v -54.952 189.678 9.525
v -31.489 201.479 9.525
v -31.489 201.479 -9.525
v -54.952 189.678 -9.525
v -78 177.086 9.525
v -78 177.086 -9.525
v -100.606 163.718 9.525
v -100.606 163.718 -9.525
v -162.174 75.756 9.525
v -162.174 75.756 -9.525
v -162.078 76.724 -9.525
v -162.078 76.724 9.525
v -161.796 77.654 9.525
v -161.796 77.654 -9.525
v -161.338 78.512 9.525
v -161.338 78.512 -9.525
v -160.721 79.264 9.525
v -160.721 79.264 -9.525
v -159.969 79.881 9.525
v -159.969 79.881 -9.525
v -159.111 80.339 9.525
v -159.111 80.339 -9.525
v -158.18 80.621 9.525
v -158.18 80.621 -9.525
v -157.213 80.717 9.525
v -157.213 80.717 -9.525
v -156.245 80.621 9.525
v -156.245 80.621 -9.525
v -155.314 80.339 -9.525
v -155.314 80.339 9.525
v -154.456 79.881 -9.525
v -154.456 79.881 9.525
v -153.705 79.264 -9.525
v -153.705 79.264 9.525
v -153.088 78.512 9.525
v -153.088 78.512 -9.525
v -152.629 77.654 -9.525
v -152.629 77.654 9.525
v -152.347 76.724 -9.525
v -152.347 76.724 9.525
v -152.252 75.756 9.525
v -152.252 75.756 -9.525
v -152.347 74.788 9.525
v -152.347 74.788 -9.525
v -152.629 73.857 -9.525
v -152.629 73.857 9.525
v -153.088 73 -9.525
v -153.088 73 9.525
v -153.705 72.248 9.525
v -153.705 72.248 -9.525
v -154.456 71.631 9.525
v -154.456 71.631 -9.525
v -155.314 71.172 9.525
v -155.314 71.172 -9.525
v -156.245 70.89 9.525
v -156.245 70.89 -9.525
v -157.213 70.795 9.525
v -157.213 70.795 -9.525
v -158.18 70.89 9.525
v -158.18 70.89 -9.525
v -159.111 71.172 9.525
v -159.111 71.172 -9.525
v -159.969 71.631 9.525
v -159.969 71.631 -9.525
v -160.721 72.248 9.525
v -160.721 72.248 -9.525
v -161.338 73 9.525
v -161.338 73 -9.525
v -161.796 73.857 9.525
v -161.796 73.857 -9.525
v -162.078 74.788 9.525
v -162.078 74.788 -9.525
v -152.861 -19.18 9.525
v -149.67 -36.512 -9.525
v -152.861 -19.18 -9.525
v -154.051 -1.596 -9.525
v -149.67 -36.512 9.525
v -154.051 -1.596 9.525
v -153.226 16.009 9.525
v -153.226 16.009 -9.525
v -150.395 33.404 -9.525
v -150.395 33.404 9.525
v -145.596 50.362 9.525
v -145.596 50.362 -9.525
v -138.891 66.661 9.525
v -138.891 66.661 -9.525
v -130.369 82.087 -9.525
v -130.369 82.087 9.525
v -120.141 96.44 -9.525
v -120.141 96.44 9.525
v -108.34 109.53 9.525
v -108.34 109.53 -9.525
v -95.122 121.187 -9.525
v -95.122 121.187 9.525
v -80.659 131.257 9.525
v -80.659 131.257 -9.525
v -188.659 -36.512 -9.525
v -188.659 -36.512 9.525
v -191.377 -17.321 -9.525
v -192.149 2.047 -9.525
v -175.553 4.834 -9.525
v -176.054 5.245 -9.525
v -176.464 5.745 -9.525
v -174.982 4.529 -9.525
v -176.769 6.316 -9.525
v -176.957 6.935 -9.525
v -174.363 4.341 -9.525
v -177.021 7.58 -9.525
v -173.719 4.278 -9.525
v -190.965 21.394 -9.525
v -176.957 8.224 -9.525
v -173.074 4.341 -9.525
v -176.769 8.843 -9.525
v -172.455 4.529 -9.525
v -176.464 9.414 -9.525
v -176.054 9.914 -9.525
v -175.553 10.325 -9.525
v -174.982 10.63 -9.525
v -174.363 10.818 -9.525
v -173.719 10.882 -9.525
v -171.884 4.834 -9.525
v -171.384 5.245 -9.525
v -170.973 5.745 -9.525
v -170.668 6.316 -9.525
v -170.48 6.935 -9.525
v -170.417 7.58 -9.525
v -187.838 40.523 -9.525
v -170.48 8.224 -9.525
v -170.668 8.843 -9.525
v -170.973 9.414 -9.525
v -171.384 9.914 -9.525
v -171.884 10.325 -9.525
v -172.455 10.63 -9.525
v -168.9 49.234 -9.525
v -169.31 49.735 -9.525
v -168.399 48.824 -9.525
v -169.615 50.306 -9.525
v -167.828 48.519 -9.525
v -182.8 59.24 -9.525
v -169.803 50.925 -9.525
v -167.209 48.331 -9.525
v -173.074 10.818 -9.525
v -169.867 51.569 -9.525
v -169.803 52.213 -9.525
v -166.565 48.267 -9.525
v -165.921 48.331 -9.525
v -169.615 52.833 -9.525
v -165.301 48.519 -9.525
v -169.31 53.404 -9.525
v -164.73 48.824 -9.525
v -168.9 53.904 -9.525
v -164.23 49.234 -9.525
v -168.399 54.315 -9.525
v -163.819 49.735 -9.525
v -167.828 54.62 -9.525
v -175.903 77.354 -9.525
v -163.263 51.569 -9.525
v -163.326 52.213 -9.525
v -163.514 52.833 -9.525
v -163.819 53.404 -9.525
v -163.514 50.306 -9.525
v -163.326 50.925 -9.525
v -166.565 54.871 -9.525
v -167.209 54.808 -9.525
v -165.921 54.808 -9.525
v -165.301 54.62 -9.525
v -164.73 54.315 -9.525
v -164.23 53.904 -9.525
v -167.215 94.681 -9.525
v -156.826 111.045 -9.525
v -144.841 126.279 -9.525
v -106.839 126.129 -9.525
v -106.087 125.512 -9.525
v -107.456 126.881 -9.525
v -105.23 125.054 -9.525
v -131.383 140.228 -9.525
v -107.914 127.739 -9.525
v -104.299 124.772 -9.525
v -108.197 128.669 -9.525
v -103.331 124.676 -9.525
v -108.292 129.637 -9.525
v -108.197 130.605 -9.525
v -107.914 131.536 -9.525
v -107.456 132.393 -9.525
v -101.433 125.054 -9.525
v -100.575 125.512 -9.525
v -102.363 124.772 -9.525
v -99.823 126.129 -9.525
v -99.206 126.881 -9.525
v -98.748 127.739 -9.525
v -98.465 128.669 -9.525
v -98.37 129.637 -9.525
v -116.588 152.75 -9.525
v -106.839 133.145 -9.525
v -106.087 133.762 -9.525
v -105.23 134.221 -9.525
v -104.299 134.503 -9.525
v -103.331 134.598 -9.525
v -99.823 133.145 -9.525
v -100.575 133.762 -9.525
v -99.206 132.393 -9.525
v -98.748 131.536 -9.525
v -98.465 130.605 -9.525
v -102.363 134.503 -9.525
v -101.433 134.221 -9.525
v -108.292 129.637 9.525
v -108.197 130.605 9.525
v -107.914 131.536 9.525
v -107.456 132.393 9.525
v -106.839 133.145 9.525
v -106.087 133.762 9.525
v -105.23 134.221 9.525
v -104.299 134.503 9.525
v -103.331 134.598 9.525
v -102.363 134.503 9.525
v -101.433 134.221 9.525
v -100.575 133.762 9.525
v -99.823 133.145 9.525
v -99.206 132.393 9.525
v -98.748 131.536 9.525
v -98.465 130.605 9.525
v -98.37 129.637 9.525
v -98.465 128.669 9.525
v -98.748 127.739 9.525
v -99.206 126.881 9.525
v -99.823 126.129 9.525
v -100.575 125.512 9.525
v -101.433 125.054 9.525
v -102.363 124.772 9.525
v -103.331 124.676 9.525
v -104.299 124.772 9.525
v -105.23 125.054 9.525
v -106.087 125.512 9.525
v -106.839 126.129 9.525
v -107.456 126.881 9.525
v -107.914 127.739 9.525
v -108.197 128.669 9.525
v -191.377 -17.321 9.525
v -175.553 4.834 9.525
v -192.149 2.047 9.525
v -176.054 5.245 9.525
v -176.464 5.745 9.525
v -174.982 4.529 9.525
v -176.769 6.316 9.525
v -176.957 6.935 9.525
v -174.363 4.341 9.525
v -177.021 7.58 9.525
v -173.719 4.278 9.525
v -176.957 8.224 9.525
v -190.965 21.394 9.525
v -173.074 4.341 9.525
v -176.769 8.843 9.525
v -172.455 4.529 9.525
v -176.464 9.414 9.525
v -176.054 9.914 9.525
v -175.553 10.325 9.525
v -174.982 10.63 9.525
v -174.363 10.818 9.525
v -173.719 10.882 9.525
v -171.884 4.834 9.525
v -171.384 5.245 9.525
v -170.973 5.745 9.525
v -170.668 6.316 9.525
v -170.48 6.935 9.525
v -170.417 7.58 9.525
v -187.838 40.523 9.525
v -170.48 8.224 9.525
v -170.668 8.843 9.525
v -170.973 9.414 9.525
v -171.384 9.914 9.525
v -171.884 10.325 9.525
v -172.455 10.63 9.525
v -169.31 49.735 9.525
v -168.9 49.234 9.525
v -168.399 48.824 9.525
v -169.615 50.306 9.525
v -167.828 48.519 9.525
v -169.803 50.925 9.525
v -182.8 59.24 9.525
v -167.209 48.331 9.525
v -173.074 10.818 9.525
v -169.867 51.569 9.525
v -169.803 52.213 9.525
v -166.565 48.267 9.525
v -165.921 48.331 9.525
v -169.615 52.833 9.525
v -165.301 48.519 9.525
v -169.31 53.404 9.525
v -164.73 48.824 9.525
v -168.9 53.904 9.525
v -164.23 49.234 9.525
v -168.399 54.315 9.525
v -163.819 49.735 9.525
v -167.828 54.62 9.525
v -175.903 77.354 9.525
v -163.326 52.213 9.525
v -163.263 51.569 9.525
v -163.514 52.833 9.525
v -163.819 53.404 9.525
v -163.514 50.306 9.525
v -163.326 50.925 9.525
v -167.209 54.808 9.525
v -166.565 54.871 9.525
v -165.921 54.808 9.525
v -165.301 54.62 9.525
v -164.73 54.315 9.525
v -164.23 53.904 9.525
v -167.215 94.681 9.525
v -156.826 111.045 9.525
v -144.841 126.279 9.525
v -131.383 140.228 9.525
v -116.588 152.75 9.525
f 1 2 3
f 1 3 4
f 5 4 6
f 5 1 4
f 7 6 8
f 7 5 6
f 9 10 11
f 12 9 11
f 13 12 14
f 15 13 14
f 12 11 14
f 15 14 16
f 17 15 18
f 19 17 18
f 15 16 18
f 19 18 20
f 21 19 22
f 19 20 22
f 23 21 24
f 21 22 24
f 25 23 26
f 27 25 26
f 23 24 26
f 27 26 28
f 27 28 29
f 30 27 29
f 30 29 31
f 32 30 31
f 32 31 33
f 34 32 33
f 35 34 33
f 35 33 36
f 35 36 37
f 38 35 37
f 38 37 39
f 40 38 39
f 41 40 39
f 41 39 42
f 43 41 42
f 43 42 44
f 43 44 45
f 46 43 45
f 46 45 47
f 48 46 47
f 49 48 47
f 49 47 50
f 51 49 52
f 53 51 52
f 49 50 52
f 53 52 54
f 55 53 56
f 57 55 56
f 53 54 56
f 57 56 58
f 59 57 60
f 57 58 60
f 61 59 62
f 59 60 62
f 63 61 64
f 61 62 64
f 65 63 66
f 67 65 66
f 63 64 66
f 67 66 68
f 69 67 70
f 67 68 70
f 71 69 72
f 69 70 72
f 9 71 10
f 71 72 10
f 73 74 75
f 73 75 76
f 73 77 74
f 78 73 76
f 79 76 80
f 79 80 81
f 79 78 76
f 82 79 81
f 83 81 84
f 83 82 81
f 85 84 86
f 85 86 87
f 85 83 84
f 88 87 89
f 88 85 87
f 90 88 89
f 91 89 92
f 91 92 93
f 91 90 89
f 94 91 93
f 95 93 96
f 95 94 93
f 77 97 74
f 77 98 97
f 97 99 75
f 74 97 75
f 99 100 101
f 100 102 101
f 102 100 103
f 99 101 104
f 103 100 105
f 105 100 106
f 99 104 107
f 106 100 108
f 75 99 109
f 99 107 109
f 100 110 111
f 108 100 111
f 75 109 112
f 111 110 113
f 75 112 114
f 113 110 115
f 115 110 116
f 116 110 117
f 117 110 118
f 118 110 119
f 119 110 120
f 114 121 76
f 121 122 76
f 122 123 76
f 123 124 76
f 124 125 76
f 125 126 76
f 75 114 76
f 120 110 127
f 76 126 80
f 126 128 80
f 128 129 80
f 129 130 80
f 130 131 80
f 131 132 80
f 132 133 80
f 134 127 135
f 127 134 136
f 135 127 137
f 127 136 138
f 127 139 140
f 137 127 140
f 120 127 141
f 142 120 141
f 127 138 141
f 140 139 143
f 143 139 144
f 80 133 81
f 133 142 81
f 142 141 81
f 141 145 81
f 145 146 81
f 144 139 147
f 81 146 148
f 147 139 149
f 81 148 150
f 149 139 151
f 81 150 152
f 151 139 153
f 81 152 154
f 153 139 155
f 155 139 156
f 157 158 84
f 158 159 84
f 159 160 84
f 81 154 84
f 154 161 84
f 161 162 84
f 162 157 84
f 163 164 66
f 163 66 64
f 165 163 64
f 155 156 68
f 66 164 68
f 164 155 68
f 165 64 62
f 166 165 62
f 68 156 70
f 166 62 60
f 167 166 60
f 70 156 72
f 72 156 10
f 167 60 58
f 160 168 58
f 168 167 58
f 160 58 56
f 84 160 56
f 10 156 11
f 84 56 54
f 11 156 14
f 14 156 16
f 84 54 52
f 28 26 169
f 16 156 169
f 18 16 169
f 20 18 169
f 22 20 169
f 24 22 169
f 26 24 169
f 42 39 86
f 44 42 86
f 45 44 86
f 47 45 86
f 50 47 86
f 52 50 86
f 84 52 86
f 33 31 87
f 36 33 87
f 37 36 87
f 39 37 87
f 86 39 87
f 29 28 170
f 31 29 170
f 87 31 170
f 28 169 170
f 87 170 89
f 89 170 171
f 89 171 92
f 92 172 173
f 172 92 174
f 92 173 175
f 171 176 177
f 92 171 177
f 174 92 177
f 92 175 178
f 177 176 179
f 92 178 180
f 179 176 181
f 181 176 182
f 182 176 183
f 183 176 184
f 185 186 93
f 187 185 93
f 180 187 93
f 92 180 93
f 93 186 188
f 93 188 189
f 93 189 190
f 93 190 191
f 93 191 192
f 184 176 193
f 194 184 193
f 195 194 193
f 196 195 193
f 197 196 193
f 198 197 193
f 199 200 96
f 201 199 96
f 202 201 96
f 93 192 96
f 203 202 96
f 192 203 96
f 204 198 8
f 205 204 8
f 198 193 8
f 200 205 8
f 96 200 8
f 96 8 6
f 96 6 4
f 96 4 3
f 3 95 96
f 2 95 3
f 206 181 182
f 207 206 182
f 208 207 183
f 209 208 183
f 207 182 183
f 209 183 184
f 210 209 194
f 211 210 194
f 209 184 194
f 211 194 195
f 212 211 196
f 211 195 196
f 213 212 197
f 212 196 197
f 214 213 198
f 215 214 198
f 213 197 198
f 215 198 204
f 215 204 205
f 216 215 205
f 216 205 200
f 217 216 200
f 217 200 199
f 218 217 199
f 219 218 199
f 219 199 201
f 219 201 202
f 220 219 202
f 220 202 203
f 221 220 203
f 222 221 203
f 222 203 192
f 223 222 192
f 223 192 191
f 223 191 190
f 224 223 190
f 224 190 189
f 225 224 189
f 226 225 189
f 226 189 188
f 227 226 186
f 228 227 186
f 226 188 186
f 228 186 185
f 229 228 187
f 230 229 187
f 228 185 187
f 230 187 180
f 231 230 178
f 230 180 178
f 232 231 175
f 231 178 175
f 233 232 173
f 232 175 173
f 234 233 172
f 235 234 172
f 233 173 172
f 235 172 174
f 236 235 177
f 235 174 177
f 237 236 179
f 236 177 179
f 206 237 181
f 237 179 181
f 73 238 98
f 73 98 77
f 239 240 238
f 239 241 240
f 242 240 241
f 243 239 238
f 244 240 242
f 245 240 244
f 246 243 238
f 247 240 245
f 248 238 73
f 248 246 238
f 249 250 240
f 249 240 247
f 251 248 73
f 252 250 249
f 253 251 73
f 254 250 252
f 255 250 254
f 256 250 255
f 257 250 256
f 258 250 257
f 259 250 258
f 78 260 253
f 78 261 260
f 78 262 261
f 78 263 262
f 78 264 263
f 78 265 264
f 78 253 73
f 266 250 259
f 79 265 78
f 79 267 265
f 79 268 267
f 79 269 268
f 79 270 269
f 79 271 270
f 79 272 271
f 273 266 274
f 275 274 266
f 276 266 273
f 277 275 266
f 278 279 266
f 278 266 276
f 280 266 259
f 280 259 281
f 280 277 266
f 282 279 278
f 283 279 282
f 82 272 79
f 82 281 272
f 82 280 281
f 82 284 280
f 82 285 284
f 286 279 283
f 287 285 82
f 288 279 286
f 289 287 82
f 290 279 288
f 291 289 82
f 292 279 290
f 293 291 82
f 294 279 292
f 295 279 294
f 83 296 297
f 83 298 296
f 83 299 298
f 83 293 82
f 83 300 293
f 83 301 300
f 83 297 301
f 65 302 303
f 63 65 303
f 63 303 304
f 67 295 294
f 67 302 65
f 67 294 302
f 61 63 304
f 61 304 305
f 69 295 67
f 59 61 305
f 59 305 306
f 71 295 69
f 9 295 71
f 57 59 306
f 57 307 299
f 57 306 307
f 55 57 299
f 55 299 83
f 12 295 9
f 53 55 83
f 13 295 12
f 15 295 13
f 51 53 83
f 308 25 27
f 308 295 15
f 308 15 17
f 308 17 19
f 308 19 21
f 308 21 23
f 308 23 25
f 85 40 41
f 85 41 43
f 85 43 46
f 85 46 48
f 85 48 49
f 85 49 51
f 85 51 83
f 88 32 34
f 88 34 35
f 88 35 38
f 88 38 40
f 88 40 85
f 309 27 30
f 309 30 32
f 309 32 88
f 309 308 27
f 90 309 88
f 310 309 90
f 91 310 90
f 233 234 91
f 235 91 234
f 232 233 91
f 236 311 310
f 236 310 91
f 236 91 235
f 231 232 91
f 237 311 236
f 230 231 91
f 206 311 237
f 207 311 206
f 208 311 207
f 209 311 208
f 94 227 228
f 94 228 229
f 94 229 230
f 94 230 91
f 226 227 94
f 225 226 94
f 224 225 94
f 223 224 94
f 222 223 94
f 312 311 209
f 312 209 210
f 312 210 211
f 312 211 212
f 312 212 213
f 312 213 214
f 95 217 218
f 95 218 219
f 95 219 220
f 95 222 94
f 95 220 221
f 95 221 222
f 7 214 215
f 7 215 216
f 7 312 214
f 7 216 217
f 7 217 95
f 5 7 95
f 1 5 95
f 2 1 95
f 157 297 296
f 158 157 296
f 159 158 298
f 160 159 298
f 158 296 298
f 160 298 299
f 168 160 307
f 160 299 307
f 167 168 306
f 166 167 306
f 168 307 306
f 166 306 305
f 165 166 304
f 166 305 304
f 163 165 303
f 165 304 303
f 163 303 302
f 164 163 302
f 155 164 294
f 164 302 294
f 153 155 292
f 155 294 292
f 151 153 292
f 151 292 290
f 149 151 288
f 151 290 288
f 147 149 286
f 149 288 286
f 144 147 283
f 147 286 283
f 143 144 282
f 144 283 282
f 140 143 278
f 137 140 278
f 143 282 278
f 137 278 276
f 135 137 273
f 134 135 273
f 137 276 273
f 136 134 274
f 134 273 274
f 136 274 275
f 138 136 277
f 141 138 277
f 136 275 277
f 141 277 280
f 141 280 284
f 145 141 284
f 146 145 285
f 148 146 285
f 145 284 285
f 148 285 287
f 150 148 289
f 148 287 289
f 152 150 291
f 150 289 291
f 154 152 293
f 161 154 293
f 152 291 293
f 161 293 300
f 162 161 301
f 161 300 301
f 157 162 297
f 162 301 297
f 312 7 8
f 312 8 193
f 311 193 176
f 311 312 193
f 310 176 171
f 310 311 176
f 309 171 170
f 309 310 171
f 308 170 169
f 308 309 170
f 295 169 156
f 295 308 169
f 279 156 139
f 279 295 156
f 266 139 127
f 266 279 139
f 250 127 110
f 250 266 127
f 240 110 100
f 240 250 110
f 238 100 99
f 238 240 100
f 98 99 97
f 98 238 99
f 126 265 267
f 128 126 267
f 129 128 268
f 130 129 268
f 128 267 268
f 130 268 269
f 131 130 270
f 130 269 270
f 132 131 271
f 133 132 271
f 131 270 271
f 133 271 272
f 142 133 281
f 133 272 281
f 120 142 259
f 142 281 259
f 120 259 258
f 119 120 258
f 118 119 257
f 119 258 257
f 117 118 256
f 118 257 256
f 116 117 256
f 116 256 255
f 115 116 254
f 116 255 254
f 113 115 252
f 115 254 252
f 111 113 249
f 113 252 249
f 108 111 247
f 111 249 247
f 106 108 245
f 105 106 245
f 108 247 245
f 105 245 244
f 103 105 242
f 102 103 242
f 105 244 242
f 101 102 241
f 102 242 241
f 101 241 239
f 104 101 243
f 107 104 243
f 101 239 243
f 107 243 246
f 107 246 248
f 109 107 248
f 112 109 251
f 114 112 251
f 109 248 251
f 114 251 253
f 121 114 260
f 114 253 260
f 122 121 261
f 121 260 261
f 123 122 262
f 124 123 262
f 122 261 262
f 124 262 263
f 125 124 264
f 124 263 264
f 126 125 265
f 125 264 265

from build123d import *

# Parameters (mm, degrees)
BOSS_EXTRUDE1_DEPTH              = 9.525
SKETCH2_R                        = 3.302
CUT_EXTRUDE1_DEPTH               = 19.05
F_25_64_0_39063_DIAMETER_HOLE1_D = 9.922002


with BuildPart() as part:
    # Sketch1 → Boss-Extrude1 (new body, symmetric)
    with BuildSketch(Plane.XY):
        with BuildLine():
            Line((-80.658868274, 131.257470336), (-31.489028268, 201.479279332))
            ThreePointArc((-31.489028268, 201.479279332), (-66.529224029, 183.480200423), (-100.606355042, 163.718335568))
            ThreePointArc((-100.606355042, 163.718335568), (-175.90250014, 77.354007785), (-188.658870504, -36.5125))
            Line((-188.658870504, -36.5125), (-149.670350751, -36.5125))
            ThreePointArc((-149.670350751, -36.5125), (-142.476587623, 58.607154251), (-80.658868274, 131.257470336))
        make_face()
    extrude(amount=BOSS_EXTRUDE1_DEPTH, both=True)

    # Sketch2 → Cut-Extrude1 (cut)
    with BuildSketch(Plane.XY.offset(9.525)):
        with Locations((-173.718655592, 7.579557452)):
            Circle(SKETCH2_R)
        with Locations((-166.564839951, 51.569288407)):
            Circle(SKETCH2_R)
    extrude(amount=-CUT_EXTRUDE1_DEPTH, mode=Mode.SUBTRACT)

    # 25/64 (0.39063) Diameter Hole1 (through all)
    with Locations(Plane.XY.offset(9.525)):
        with Locations((-103.331077236, 129.637230364), (-157.212613963, 75.755693637)):
            Hole(F_25_64_0_39063_DIAMETER_HOLE1_D / 2)


solid = part.part
